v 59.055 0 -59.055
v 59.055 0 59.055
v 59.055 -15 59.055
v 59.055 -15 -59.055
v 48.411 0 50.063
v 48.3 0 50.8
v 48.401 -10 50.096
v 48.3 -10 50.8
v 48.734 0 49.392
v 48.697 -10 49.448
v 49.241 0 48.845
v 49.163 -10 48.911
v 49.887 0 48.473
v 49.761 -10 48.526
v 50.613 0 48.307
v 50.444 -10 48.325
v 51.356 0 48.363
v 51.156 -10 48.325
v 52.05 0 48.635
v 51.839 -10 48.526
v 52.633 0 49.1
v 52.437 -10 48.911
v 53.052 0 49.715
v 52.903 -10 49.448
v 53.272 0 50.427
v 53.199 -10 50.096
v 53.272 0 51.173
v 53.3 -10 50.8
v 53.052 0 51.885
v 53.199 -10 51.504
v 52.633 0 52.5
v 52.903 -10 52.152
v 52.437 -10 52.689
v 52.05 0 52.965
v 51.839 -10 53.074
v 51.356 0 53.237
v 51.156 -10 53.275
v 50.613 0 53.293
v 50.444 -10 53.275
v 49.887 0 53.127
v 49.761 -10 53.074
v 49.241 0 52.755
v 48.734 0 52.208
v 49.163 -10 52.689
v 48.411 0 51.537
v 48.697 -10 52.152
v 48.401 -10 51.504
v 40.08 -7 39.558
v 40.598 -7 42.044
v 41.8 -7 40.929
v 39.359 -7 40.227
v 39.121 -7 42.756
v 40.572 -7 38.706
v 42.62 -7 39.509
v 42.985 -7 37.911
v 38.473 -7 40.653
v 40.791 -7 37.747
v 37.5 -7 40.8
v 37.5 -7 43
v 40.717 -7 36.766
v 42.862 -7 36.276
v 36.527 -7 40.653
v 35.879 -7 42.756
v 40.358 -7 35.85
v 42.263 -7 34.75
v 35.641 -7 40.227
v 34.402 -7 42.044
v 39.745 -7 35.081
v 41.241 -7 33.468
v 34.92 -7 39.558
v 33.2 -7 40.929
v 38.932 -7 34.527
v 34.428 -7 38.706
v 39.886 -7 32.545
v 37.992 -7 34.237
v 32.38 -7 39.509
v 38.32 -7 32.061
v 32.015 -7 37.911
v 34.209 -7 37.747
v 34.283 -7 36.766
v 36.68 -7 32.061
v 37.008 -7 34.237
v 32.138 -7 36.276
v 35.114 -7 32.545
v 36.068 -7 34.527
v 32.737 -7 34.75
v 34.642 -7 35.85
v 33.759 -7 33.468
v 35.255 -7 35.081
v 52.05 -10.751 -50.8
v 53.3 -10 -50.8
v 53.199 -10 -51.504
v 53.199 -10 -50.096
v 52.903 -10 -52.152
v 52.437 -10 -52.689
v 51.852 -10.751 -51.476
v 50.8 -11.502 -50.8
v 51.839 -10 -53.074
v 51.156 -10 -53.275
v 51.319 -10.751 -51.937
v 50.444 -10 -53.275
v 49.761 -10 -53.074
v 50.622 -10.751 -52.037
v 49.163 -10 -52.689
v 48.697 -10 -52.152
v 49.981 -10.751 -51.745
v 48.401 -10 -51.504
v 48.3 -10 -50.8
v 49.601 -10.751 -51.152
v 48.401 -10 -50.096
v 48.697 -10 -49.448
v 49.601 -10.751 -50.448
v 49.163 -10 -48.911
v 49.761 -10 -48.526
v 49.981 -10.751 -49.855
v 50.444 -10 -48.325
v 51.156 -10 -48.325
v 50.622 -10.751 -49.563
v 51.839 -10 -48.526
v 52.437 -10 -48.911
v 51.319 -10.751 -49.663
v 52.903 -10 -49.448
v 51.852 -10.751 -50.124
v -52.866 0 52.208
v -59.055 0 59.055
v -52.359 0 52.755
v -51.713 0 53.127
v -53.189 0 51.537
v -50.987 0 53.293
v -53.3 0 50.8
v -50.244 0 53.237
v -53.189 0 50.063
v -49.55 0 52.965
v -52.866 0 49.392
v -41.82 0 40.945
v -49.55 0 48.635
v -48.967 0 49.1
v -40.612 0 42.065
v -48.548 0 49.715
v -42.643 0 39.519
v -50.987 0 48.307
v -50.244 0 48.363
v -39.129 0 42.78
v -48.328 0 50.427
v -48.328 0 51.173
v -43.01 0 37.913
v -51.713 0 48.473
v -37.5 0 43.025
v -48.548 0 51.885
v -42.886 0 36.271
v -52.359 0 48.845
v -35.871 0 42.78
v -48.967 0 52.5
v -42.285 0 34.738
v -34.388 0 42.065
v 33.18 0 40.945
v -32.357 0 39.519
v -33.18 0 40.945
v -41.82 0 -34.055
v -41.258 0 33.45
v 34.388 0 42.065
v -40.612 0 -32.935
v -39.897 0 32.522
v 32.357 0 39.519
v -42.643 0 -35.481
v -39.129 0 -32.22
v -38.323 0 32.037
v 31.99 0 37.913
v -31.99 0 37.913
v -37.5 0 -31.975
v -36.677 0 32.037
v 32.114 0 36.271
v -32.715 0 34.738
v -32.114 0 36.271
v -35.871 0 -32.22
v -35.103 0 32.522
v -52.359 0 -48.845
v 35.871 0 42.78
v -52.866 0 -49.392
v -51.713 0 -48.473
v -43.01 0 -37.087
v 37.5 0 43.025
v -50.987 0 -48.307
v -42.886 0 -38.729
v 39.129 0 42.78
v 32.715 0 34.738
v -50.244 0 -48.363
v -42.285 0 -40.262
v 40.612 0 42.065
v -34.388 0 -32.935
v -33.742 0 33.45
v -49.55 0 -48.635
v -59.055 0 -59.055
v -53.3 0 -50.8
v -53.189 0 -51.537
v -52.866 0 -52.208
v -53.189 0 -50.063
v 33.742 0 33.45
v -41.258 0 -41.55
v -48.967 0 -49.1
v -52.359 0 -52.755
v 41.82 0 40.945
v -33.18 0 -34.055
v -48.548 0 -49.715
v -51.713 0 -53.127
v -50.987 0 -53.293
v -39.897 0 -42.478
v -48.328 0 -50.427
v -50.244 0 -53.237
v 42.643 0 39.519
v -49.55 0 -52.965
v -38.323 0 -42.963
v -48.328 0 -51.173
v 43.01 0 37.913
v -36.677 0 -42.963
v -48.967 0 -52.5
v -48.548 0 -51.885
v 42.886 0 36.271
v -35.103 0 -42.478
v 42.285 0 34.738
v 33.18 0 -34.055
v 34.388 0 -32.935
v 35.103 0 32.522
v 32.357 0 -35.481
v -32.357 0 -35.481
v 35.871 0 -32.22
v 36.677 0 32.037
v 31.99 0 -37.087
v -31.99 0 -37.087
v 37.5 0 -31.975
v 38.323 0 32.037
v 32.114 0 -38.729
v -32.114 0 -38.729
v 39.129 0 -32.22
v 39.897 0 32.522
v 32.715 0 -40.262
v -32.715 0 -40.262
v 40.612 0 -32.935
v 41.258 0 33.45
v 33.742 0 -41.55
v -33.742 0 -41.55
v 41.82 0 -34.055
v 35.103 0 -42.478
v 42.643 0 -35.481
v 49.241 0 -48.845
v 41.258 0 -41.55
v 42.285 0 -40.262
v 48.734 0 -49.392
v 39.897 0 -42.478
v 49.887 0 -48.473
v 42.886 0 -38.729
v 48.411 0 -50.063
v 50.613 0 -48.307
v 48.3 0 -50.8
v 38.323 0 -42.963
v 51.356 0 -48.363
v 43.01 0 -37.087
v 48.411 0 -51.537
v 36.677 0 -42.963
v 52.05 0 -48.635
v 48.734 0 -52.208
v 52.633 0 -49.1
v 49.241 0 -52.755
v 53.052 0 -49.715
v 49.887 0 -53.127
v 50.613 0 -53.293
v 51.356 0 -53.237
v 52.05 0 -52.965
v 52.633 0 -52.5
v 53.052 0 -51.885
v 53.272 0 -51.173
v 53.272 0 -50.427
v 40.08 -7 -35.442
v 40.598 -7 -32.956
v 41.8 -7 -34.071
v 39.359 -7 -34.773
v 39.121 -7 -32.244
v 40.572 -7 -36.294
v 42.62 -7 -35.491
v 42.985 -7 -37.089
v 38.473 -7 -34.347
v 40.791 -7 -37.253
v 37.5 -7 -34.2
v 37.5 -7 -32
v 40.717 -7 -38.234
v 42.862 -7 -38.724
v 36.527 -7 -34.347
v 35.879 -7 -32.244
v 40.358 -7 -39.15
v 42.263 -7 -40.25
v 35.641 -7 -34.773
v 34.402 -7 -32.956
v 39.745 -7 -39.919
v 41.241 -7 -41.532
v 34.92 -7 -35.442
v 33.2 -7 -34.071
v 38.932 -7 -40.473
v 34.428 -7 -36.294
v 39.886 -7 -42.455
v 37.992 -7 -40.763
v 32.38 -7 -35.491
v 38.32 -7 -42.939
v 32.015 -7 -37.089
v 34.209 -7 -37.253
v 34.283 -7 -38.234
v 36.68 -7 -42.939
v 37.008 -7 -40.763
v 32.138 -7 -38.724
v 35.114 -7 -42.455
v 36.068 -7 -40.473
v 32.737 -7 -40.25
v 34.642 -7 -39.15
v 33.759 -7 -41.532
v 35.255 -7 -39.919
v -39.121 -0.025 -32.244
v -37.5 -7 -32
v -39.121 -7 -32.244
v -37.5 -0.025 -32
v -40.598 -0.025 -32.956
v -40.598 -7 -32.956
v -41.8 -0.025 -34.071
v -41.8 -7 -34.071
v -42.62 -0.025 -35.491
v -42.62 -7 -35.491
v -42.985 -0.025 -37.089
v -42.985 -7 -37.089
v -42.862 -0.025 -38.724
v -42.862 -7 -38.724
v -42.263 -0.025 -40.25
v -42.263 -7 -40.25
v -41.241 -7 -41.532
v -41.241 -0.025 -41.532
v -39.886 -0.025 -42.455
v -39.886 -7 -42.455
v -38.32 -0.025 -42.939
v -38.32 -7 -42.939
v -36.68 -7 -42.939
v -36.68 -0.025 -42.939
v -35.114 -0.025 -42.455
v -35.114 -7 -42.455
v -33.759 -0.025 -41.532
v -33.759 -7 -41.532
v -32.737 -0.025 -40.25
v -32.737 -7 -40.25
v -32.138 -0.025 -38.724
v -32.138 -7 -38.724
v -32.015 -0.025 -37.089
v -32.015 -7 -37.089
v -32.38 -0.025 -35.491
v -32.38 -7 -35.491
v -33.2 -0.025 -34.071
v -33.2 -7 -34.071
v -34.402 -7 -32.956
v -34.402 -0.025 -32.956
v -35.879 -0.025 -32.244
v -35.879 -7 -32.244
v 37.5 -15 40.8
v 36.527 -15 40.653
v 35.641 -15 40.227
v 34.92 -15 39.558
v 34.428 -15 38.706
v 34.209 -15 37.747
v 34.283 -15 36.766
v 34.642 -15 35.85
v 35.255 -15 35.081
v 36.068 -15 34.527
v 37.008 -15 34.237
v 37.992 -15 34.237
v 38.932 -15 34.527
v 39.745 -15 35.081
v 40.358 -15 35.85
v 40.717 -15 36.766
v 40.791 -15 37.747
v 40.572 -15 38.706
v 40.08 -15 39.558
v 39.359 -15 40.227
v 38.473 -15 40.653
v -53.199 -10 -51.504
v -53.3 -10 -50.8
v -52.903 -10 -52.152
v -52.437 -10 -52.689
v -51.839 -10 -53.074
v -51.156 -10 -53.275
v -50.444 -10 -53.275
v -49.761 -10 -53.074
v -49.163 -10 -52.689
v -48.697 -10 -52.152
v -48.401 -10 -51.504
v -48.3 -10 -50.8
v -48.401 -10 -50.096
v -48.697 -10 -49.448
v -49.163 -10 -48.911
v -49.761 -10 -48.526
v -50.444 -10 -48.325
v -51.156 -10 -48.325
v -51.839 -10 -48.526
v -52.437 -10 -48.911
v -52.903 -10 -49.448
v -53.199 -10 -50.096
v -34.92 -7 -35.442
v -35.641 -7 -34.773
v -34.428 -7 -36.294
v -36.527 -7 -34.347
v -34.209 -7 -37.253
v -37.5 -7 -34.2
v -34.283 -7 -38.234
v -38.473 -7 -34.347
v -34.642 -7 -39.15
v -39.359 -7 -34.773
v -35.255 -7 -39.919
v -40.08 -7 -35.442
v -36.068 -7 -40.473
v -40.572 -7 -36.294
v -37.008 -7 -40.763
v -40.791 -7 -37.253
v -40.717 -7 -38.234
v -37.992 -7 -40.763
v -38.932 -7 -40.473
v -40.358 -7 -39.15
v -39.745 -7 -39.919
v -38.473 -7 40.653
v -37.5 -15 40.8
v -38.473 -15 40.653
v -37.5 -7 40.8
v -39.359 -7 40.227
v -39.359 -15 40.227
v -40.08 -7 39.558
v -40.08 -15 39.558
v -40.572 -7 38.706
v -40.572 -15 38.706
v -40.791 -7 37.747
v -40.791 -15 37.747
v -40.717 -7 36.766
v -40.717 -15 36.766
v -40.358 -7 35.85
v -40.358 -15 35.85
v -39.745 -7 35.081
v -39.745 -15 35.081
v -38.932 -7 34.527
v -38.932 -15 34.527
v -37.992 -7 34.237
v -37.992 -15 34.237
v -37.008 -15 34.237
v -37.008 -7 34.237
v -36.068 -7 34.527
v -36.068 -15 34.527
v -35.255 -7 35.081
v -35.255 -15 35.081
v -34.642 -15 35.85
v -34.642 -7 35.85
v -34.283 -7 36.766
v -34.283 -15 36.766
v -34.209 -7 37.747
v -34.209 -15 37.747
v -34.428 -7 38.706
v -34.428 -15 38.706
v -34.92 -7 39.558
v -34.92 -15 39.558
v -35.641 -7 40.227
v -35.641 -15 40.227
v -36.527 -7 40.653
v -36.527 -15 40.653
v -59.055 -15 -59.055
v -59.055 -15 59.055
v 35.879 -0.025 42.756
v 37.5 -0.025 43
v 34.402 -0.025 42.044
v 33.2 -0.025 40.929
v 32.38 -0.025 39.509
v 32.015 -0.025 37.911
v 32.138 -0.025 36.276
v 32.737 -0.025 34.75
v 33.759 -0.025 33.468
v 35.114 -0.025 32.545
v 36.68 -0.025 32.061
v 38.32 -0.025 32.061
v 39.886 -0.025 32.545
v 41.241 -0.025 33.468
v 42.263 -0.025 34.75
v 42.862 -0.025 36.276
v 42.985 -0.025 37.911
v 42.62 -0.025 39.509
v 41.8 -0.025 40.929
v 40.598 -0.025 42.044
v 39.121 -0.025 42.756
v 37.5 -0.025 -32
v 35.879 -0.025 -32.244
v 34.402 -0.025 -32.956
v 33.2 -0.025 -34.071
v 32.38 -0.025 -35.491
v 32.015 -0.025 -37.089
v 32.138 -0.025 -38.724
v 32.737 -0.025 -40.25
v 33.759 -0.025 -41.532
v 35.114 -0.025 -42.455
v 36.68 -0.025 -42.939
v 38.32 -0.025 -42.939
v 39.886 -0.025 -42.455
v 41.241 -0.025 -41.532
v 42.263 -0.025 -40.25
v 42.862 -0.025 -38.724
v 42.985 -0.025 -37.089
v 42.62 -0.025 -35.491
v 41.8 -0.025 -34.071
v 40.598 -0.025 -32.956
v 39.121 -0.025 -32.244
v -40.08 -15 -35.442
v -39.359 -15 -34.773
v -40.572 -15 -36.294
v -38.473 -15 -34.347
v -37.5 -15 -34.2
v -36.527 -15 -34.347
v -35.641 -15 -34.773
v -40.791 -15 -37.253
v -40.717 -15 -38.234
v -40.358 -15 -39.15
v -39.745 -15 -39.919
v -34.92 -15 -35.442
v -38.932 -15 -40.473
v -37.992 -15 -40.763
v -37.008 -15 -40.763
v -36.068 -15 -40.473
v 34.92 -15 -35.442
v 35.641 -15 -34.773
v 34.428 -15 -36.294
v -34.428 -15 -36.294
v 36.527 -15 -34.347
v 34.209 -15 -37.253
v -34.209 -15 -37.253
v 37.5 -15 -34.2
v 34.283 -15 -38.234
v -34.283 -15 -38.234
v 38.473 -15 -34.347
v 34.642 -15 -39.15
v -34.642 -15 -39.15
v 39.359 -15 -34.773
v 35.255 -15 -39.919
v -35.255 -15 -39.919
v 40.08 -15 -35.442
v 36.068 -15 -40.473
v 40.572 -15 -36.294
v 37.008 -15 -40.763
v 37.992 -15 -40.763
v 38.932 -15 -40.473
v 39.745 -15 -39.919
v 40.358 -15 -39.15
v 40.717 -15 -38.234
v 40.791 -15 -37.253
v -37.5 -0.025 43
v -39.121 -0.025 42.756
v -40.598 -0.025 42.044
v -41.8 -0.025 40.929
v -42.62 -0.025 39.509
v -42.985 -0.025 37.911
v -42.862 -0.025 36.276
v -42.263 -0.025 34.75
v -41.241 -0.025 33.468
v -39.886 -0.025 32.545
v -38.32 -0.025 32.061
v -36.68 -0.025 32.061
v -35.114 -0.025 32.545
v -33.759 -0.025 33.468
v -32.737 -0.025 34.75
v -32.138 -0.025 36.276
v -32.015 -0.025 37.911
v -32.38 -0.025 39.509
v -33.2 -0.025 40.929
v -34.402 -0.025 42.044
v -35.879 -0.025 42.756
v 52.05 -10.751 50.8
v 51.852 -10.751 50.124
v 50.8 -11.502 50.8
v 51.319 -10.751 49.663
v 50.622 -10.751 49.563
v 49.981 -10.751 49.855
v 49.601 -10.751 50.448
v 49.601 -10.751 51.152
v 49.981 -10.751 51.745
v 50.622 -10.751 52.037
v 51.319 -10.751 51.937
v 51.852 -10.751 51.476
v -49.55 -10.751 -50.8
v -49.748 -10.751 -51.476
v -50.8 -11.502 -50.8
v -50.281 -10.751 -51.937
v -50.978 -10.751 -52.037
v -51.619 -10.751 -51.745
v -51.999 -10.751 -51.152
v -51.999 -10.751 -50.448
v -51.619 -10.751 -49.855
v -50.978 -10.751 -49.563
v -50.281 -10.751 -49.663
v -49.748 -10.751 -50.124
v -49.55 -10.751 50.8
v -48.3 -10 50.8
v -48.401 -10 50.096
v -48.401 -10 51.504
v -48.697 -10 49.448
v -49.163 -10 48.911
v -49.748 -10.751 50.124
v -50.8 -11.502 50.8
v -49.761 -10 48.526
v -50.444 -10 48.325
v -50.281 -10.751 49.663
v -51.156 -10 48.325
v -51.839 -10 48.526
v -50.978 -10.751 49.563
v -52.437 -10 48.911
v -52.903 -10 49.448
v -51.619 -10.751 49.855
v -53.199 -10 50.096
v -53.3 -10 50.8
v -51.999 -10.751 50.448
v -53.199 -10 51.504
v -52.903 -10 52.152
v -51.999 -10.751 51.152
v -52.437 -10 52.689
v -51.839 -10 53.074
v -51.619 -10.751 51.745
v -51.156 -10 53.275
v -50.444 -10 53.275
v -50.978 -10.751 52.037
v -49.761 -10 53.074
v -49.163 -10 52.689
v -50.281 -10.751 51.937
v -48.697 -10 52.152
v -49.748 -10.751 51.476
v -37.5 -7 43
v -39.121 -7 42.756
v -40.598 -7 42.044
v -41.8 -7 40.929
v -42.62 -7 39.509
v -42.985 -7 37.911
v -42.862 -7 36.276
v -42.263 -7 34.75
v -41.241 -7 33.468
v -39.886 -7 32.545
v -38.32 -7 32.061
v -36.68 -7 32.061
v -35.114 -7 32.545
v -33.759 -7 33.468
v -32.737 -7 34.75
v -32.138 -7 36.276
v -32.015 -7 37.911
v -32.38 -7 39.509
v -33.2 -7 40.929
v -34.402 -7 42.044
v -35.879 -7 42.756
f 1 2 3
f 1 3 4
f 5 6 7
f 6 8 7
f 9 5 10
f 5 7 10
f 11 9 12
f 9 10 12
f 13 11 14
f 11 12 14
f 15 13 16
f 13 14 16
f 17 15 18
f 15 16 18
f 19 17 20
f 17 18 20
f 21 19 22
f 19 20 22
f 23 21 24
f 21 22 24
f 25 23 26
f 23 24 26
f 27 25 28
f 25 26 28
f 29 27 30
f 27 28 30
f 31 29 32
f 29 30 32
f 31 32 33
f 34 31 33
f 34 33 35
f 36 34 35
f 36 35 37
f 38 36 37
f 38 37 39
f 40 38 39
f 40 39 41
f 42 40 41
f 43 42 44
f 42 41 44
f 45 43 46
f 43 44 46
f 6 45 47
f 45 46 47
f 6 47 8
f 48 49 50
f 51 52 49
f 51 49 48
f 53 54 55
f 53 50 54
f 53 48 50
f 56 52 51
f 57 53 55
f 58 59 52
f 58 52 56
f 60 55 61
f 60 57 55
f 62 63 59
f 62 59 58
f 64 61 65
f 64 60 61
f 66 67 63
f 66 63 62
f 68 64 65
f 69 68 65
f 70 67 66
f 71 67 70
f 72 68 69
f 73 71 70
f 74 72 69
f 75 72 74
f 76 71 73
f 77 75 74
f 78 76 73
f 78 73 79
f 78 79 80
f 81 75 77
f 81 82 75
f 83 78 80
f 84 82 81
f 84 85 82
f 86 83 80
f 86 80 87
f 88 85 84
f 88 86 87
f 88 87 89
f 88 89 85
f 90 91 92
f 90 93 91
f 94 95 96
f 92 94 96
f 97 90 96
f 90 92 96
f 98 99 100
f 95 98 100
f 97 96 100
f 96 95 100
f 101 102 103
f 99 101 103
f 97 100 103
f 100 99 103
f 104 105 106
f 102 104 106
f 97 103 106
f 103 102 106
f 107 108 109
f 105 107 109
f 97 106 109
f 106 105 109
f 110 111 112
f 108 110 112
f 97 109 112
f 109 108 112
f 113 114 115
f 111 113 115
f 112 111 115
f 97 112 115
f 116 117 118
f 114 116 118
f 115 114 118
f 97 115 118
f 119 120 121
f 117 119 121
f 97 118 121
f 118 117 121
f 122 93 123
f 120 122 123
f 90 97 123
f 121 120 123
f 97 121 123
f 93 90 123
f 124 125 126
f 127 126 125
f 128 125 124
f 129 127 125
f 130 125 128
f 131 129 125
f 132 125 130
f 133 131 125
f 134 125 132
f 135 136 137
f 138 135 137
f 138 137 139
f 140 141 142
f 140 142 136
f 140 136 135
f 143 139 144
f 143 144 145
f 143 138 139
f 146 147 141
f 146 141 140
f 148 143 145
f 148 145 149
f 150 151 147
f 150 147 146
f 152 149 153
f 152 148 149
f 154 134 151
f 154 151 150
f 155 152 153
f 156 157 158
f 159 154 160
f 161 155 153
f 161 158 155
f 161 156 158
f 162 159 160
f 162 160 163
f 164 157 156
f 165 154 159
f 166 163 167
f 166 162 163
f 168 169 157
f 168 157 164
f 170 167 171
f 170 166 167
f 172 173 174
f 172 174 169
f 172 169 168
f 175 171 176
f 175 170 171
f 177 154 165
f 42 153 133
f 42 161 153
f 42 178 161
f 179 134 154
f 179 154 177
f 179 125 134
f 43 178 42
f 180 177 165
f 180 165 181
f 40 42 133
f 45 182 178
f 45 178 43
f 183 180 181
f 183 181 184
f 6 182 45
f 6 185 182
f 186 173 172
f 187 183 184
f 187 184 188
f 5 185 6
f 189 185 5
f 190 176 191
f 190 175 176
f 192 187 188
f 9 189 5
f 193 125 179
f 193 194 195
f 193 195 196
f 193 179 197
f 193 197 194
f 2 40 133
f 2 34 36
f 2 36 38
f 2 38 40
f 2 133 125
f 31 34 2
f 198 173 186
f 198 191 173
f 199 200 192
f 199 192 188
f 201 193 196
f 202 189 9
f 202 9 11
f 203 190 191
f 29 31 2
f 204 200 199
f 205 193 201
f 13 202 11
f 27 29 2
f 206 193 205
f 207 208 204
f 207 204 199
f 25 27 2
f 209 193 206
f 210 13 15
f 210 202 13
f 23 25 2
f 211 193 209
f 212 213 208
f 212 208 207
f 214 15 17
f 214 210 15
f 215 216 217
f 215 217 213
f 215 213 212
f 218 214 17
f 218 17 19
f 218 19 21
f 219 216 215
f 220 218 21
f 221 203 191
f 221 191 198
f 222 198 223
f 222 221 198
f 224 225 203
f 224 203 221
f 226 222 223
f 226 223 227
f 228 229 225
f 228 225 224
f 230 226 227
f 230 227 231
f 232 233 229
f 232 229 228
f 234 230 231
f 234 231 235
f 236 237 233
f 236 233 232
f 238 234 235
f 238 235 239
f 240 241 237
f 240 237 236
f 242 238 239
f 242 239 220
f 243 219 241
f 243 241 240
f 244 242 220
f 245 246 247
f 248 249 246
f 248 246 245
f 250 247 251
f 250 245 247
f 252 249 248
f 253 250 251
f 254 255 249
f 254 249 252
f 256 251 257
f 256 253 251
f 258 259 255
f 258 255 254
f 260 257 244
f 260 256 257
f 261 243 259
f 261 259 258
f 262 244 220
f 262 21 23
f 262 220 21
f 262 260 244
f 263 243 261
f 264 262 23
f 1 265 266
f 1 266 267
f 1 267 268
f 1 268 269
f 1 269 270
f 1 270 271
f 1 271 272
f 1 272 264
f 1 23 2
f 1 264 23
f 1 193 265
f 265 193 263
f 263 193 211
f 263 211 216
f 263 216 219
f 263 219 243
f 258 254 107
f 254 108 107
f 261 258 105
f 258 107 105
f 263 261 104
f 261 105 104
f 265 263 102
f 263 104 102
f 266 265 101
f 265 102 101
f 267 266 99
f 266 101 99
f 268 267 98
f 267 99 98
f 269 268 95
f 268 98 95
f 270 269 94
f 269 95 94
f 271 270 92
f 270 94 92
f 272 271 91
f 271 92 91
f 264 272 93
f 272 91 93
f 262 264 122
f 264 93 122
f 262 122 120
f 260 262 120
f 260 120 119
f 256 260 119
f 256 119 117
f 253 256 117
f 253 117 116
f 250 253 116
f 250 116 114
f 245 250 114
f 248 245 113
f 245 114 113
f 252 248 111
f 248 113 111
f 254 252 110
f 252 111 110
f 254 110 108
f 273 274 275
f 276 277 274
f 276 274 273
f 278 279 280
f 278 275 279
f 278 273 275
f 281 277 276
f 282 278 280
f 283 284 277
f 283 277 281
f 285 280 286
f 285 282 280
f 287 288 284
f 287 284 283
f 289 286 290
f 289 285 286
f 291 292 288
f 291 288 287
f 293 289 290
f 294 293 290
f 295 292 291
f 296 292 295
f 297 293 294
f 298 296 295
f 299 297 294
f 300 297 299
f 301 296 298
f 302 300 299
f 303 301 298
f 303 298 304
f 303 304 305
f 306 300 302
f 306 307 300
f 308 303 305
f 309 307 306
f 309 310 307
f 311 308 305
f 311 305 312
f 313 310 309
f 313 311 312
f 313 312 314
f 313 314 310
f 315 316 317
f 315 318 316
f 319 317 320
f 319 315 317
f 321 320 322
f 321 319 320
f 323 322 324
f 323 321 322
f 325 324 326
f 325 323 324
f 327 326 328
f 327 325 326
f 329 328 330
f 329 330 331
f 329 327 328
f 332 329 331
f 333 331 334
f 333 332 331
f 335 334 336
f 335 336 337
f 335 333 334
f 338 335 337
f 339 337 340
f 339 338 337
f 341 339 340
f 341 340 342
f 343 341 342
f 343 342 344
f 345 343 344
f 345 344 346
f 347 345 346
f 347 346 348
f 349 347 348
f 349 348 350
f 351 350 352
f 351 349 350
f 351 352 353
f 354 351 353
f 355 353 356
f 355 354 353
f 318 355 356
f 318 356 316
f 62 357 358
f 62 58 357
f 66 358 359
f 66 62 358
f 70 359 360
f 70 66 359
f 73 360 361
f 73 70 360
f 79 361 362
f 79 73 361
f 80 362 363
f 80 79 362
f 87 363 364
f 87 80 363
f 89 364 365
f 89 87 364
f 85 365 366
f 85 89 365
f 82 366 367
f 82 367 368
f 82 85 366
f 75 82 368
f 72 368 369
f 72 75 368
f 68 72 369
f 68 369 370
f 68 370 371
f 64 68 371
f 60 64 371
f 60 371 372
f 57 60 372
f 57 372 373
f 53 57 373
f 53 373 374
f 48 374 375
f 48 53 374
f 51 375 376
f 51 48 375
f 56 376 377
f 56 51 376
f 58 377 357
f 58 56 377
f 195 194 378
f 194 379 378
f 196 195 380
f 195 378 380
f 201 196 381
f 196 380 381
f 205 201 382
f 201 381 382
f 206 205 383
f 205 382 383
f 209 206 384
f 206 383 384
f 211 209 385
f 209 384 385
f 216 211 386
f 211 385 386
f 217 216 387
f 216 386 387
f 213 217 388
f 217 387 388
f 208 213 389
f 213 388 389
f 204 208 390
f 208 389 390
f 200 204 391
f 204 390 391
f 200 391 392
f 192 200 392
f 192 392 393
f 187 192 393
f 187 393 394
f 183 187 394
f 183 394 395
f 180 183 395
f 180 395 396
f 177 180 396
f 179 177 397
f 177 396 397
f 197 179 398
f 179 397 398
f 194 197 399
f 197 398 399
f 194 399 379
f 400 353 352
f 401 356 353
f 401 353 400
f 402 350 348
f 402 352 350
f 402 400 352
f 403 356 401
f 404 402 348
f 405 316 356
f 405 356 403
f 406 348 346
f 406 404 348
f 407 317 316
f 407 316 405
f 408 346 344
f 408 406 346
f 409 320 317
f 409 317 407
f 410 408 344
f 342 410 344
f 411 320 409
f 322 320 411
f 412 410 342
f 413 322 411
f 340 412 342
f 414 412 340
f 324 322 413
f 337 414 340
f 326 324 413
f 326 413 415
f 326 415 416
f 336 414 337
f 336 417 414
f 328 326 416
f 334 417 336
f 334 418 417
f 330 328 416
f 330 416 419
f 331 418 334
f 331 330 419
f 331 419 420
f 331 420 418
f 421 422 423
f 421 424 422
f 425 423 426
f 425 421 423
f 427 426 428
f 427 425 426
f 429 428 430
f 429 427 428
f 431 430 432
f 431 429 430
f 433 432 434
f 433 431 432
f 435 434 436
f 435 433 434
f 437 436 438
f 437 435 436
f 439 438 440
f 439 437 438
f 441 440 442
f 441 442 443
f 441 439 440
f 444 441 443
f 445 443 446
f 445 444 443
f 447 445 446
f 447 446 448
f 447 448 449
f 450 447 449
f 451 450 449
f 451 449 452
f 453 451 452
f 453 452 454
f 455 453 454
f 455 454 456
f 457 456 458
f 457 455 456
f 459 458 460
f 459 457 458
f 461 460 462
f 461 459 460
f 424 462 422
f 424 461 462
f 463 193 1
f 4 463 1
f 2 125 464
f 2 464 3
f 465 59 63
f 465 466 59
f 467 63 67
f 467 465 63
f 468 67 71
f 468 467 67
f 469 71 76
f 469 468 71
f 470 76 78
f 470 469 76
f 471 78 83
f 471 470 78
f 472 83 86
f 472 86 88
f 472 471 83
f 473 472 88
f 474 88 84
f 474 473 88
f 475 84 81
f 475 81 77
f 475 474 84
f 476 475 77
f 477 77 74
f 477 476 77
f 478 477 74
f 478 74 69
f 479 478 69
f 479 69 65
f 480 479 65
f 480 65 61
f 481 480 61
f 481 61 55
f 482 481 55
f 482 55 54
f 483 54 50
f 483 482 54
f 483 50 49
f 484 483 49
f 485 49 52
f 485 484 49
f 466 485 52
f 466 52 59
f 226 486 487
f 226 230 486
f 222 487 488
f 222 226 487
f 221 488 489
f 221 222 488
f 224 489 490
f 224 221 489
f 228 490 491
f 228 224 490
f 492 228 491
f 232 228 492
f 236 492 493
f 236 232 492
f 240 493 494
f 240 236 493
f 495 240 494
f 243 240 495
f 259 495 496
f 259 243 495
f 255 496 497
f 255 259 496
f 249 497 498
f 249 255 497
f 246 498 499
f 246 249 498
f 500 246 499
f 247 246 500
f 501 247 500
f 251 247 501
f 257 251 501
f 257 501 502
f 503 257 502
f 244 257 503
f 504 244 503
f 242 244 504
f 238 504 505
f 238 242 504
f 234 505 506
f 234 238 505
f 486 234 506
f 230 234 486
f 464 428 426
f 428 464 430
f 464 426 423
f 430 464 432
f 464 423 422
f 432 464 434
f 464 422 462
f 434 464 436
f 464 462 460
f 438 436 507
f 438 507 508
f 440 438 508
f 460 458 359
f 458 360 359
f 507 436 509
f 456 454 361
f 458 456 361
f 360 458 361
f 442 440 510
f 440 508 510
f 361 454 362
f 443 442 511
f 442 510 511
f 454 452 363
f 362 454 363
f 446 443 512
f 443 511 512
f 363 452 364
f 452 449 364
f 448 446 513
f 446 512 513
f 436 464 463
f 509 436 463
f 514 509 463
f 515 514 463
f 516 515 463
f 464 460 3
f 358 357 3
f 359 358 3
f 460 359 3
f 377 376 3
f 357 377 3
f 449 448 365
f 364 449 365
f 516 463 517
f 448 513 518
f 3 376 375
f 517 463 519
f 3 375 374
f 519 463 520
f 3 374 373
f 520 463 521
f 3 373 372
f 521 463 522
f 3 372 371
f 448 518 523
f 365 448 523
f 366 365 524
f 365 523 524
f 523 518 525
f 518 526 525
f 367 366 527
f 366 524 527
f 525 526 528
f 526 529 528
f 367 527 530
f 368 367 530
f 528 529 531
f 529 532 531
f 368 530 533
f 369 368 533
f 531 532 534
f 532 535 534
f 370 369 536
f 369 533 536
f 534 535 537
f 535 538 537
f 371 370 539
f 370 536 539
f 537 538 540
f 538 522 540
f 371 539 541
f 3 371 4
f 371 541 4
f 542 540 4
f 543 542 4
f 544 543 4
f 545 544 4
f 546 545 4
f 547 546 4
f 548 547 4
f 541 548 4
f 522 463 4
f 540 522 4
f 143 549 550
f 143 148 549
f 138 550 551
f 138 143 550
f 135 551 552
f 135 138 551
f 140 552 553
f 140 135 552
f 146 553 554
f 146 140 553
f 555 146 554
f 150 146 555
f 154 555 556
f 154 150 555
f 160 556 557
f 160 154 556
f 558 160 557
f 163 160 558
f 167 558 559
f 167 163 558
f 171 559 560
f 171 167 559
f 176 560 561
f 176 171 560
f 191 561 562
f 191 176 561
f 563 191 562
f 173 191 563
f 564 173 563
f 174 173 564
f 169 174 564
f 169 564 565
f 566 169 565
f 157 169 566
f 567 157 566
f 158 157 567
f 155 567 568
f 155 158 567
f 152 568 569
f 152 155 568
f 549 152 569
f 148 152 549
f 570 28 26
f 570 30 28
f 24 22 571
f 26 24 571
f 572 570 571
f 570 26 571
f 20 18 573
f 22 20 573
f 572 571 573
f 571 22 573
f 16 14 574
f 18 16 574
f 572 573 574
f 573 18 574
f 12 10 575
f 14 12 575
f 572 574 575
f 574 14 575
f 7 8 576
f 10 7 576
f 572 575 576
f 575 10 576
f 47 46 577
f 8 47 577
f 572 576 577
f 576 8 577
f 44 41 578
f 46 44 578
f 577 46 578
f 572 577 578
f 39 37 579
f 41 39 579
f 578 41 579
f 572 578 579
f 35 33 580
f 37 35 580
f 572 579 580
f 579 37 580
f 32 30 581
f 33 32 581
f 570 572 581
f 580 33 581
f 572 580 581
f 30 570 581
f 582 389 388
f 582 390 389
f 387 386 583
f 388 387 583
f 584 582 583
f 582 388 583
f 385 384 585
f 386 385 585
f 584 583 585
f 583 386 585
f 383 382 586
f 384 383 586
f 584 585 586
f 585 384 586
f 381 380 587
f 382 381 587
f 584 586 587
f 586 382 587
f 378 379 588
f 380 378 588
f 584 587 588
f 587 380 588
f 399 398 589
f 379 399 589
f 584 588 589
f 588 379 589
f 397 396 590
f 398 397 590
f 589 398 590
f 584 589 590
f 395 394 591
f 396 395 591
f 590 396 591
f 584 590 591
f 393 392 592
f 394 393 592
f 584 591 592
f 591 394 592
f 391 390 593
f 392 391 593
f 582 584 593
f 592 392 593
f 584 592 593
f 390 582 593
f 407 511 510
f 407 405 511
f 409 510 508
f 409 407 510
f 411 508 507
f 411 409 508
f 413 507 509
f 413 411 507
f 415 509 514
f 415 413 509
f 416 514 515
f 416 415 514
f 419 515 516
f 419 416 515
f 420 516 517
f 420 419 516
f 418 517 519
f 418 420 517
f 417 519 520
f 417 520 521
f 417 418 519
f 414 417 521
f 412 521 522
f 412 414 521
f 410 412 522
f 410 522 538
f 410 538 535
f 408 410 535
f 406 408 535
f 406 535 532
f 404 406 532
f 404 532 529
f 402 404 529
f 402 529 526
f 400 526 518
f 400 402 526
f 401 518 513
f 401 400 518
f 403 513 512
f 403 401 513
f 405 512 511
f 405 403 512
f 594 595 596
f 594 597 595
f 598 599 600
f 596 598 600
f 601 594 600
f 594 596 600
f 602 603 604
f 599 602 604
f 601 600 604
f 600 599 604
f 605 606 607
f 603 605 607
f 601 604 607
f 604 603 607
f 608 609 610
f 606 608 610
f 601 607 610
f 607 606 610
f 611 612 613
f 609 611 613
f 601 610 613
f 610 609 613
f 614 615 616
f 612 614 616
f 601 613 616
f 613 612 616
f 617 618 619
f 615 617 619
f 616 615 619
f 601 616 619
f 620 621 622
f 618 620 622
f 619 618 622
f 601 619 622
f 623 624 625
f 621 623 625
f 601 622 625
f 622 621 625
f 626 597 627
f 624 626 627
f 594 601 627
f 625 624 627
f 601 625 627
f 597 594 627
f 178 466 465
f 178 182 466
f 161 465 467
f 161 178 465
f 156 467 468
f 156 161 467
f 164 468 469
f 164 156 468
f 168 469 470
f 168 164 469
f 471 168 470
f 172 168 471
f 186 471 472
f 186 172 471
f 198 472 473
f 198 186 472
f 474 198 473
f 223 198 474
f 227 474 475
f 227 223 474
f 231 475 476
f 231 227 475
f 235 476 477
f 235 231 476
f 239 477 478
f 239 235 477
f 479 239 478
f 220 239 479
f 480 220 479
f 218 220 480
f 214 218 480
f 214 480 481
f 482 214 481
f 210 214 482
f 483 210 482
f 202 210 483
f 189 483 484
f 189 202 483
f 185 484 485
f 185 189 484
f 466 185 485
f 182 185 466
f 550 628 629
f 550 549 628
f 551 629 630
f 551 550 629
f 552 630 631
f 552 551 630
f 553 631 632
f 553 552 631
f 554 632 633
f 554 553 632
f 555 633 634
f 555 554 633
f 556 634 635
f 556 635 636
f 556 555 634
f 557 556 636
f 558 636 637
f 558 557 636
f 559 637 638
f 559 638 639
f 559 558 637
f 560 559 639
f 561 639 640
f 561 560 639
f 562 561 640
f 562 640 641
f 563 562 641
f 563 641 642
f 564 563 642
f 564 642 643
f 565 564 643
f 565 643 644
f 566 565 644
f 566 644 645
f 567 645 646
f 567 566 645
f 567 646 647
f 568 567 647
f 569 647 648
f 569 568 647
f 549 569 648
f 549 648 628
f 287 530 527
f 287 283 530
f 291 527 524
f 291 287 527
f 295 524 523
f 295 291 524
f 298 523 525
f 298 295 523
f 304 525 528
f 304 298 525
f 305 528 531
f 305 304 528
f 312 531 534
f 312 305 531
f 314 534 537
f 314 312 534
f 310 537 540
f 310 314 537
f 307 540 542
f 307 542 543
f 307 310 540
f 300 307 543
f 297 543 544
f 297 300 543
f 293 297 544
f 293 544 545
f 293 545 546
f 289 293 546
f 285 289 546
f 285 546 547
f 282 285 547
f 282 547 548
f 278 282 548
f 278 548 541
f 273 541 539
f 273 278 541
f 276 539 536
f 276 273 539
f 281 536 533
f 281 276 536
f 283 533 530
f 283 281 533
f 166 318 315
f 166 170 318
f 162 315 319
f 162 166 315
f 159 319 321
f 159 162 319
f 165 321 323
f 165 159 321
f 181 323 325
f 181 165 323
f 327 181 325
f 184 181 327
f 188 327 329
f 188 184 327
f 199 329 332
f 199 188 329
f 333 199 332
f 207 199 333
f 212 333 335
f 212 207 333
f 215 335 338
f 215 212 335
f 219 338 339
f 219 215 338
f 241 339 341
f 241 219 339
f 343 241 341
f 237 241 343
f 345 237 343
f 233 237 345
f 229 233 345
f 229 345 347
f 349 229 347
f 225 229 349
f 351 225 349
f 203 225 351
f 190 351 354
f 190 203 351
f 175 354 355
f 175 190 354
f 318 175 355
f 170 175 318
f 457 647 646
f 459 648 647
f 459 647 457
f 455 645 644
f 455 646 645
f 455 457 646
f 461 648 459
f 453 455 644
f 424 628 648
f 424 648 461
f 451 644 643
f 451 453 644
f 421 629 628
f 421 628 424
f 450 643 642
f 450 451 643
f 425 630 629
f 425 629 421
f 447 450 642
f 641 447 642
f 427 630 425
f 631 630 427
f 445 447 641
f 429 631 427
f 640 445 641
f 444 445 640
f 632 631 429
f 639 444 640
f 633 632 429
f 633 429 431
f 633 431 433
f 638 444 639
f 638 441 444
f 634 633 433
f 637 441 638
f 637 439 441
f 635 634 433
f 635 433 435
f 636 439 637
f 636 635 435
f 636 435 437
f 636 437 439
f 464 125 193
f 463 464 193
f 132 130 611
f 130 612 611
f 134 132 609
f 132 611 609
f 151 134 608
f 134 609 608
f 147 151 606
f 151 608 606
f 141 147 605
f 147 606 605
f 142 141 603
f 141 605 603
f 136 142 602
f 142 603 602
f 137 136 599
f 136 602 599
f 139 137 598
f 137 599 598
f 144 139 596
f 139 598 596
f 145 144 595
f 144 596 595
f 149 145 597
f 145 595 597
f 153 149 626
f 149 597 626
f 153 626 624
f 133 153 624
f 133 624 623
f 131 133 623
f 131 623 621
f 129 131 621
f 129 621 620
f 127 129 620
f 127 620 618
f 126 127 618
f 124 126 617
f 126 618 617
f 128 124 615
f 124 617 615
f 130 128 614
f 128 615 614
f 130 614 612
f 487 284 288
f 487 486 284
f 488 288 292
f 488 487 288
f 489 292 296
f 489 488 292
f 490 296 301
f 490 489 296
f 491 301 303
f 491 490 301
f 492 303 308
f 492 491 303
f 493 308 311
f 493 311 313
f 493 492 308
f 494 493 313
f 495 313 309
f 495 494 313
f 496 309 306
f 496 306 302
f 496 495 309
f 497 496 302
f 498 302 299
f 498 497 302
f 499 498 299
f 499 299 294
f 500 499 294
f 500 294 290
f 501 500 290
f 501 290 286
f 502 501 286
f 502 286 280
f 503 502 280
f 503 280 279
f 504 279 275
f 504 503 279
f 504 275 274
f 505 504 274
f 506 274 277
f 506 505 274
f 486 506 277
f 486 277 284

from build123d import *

# Parameters (mm, degrees)
SKETCH1_W                     = 118.11
SKETCH1_H                     = 118.11
BOSS_EXTRUDE1_DEPTH           = 15
CBORE_FOR_M6_SHCS1_AT_2_COUNT = 2
CBORE_FOR_M6_SHCS1_AT_2_PITCH = 75
CBORE_FOR_M6_SHCS1_AT_3_COUNT = 2
CBORE_FOR_M6_SHCS1_AT_3_PITCH = 106.066017178
CBORE_FOR_M6_SHCS1_AT_4_COUNT = 2
CBORE_FOR_M6_SHCS1_AT_4_PITCH = 75
M6X1_0_TAPPED_HOLE1_D         = 5
M6X1_0_TAPPED_HOLE1_DEPTH     = 10
M6X1_0_TAPPED_HOLE1_TIP       = 1.502151548


with BuildPart() as part:
    # Sketch1 → Boss-Extrude1 (new body)
    with BuildSketch(Plane(origin=(0, 0, 0), x_dir=(1, 0, 0), z_dir=(0, 1, 0))):
        Rectangle(SKETCH1_W, SKETCH1_H)
    extrude(amount=-BOSS_EXTRUDE1_DEPTH)

    # Sketch5 → CBORE for M6 SHCS1 (revolve, cut)
    with BuildSketch(Plane(origin=(-37.5, 0, 37.5), x_dir=(0, 0, 1), z_dir=(1, 0, 0))):
        Polygon((0, 0), (0, 16.982840043), (3.3, 15), (3.3, 7), (5.5, 7), (5.5, 0.025), (5.525, 0), align=None)
    cbore_for_m6_shcs1 = revolve(axis=Axis((-37.5, 6.35, 37.5), (0, -1, 0)), mode=Mode.SUBTRACT)

    # CBORE for M6 SHCS1 at 2: CBORE for M6 SHCS1 ×2
    with Locations(*[(i * CBORE_FOR_M6_SHCS1_AT_2_PITCH, 0, 0) for i in range(1, CBORE_FOR_M6_SHCS1_AT_2_COUNT)]):
        add(cbore_for_m6_shcs1, mode=Mode.SUBTRACT)

    # CBORE for M6 SHCS1 at 3: CBORE for M6 SHCS1 ×2
    with Locations(*[Vector(0.707106781, 0, -0.707106781) * (i * CBORE_FOR_M6_SHCS1_AT_3_PITCH) for i in range(1, CBORE_FOR_M6_SHCS1_AT_3_COUNT)]):
        add(cbore_for_m6_shcs1, mode=Mode.SUBTRACT)

    # CBORE for M6 SHCS1 at 4: CBORE for M6 SHCS1 ×2
    with Locations(*[(0, 0, -i * CBORE_FOR_M6_SHCS1_AT_4_PITCH) for i in range(1, CBORE_FOR_M6_SHCS1_AT_4_COUNT)]):
        add(cbore_for_m6_shcs1, mode=Mode.SUBTRACT)

    # M6x1.0 Tapped Hole1
    with Locations(Plane(origin=(0, 0, 0), x_dir=(1, 0, 0), z_dir=(0, 1, 0))):
        with Locations((-50.8, -50.8), (-50.8, 50.8), (50.8, 50.8), (50.8, -50.8)):
            Hole(M6X1_0_TAPPED_HOLE1_D / 2, depth=M6X1_0_TAPPED_HOLE1_DEPTH)
            with Locations((0, 0, -(M6X1_0_TAPPED_HOLE1_DEPTH + M6X1_0_TAPPED_HOLE1_TIP / 2))):  # 118° drill point
                Cone(0, M6X1_0_TAPPED_HOLE1_D / 2, M6X1_0_TAPPED_HOLE1_TIP, mode=Mode.SUBTRACT)


solid = part.part
